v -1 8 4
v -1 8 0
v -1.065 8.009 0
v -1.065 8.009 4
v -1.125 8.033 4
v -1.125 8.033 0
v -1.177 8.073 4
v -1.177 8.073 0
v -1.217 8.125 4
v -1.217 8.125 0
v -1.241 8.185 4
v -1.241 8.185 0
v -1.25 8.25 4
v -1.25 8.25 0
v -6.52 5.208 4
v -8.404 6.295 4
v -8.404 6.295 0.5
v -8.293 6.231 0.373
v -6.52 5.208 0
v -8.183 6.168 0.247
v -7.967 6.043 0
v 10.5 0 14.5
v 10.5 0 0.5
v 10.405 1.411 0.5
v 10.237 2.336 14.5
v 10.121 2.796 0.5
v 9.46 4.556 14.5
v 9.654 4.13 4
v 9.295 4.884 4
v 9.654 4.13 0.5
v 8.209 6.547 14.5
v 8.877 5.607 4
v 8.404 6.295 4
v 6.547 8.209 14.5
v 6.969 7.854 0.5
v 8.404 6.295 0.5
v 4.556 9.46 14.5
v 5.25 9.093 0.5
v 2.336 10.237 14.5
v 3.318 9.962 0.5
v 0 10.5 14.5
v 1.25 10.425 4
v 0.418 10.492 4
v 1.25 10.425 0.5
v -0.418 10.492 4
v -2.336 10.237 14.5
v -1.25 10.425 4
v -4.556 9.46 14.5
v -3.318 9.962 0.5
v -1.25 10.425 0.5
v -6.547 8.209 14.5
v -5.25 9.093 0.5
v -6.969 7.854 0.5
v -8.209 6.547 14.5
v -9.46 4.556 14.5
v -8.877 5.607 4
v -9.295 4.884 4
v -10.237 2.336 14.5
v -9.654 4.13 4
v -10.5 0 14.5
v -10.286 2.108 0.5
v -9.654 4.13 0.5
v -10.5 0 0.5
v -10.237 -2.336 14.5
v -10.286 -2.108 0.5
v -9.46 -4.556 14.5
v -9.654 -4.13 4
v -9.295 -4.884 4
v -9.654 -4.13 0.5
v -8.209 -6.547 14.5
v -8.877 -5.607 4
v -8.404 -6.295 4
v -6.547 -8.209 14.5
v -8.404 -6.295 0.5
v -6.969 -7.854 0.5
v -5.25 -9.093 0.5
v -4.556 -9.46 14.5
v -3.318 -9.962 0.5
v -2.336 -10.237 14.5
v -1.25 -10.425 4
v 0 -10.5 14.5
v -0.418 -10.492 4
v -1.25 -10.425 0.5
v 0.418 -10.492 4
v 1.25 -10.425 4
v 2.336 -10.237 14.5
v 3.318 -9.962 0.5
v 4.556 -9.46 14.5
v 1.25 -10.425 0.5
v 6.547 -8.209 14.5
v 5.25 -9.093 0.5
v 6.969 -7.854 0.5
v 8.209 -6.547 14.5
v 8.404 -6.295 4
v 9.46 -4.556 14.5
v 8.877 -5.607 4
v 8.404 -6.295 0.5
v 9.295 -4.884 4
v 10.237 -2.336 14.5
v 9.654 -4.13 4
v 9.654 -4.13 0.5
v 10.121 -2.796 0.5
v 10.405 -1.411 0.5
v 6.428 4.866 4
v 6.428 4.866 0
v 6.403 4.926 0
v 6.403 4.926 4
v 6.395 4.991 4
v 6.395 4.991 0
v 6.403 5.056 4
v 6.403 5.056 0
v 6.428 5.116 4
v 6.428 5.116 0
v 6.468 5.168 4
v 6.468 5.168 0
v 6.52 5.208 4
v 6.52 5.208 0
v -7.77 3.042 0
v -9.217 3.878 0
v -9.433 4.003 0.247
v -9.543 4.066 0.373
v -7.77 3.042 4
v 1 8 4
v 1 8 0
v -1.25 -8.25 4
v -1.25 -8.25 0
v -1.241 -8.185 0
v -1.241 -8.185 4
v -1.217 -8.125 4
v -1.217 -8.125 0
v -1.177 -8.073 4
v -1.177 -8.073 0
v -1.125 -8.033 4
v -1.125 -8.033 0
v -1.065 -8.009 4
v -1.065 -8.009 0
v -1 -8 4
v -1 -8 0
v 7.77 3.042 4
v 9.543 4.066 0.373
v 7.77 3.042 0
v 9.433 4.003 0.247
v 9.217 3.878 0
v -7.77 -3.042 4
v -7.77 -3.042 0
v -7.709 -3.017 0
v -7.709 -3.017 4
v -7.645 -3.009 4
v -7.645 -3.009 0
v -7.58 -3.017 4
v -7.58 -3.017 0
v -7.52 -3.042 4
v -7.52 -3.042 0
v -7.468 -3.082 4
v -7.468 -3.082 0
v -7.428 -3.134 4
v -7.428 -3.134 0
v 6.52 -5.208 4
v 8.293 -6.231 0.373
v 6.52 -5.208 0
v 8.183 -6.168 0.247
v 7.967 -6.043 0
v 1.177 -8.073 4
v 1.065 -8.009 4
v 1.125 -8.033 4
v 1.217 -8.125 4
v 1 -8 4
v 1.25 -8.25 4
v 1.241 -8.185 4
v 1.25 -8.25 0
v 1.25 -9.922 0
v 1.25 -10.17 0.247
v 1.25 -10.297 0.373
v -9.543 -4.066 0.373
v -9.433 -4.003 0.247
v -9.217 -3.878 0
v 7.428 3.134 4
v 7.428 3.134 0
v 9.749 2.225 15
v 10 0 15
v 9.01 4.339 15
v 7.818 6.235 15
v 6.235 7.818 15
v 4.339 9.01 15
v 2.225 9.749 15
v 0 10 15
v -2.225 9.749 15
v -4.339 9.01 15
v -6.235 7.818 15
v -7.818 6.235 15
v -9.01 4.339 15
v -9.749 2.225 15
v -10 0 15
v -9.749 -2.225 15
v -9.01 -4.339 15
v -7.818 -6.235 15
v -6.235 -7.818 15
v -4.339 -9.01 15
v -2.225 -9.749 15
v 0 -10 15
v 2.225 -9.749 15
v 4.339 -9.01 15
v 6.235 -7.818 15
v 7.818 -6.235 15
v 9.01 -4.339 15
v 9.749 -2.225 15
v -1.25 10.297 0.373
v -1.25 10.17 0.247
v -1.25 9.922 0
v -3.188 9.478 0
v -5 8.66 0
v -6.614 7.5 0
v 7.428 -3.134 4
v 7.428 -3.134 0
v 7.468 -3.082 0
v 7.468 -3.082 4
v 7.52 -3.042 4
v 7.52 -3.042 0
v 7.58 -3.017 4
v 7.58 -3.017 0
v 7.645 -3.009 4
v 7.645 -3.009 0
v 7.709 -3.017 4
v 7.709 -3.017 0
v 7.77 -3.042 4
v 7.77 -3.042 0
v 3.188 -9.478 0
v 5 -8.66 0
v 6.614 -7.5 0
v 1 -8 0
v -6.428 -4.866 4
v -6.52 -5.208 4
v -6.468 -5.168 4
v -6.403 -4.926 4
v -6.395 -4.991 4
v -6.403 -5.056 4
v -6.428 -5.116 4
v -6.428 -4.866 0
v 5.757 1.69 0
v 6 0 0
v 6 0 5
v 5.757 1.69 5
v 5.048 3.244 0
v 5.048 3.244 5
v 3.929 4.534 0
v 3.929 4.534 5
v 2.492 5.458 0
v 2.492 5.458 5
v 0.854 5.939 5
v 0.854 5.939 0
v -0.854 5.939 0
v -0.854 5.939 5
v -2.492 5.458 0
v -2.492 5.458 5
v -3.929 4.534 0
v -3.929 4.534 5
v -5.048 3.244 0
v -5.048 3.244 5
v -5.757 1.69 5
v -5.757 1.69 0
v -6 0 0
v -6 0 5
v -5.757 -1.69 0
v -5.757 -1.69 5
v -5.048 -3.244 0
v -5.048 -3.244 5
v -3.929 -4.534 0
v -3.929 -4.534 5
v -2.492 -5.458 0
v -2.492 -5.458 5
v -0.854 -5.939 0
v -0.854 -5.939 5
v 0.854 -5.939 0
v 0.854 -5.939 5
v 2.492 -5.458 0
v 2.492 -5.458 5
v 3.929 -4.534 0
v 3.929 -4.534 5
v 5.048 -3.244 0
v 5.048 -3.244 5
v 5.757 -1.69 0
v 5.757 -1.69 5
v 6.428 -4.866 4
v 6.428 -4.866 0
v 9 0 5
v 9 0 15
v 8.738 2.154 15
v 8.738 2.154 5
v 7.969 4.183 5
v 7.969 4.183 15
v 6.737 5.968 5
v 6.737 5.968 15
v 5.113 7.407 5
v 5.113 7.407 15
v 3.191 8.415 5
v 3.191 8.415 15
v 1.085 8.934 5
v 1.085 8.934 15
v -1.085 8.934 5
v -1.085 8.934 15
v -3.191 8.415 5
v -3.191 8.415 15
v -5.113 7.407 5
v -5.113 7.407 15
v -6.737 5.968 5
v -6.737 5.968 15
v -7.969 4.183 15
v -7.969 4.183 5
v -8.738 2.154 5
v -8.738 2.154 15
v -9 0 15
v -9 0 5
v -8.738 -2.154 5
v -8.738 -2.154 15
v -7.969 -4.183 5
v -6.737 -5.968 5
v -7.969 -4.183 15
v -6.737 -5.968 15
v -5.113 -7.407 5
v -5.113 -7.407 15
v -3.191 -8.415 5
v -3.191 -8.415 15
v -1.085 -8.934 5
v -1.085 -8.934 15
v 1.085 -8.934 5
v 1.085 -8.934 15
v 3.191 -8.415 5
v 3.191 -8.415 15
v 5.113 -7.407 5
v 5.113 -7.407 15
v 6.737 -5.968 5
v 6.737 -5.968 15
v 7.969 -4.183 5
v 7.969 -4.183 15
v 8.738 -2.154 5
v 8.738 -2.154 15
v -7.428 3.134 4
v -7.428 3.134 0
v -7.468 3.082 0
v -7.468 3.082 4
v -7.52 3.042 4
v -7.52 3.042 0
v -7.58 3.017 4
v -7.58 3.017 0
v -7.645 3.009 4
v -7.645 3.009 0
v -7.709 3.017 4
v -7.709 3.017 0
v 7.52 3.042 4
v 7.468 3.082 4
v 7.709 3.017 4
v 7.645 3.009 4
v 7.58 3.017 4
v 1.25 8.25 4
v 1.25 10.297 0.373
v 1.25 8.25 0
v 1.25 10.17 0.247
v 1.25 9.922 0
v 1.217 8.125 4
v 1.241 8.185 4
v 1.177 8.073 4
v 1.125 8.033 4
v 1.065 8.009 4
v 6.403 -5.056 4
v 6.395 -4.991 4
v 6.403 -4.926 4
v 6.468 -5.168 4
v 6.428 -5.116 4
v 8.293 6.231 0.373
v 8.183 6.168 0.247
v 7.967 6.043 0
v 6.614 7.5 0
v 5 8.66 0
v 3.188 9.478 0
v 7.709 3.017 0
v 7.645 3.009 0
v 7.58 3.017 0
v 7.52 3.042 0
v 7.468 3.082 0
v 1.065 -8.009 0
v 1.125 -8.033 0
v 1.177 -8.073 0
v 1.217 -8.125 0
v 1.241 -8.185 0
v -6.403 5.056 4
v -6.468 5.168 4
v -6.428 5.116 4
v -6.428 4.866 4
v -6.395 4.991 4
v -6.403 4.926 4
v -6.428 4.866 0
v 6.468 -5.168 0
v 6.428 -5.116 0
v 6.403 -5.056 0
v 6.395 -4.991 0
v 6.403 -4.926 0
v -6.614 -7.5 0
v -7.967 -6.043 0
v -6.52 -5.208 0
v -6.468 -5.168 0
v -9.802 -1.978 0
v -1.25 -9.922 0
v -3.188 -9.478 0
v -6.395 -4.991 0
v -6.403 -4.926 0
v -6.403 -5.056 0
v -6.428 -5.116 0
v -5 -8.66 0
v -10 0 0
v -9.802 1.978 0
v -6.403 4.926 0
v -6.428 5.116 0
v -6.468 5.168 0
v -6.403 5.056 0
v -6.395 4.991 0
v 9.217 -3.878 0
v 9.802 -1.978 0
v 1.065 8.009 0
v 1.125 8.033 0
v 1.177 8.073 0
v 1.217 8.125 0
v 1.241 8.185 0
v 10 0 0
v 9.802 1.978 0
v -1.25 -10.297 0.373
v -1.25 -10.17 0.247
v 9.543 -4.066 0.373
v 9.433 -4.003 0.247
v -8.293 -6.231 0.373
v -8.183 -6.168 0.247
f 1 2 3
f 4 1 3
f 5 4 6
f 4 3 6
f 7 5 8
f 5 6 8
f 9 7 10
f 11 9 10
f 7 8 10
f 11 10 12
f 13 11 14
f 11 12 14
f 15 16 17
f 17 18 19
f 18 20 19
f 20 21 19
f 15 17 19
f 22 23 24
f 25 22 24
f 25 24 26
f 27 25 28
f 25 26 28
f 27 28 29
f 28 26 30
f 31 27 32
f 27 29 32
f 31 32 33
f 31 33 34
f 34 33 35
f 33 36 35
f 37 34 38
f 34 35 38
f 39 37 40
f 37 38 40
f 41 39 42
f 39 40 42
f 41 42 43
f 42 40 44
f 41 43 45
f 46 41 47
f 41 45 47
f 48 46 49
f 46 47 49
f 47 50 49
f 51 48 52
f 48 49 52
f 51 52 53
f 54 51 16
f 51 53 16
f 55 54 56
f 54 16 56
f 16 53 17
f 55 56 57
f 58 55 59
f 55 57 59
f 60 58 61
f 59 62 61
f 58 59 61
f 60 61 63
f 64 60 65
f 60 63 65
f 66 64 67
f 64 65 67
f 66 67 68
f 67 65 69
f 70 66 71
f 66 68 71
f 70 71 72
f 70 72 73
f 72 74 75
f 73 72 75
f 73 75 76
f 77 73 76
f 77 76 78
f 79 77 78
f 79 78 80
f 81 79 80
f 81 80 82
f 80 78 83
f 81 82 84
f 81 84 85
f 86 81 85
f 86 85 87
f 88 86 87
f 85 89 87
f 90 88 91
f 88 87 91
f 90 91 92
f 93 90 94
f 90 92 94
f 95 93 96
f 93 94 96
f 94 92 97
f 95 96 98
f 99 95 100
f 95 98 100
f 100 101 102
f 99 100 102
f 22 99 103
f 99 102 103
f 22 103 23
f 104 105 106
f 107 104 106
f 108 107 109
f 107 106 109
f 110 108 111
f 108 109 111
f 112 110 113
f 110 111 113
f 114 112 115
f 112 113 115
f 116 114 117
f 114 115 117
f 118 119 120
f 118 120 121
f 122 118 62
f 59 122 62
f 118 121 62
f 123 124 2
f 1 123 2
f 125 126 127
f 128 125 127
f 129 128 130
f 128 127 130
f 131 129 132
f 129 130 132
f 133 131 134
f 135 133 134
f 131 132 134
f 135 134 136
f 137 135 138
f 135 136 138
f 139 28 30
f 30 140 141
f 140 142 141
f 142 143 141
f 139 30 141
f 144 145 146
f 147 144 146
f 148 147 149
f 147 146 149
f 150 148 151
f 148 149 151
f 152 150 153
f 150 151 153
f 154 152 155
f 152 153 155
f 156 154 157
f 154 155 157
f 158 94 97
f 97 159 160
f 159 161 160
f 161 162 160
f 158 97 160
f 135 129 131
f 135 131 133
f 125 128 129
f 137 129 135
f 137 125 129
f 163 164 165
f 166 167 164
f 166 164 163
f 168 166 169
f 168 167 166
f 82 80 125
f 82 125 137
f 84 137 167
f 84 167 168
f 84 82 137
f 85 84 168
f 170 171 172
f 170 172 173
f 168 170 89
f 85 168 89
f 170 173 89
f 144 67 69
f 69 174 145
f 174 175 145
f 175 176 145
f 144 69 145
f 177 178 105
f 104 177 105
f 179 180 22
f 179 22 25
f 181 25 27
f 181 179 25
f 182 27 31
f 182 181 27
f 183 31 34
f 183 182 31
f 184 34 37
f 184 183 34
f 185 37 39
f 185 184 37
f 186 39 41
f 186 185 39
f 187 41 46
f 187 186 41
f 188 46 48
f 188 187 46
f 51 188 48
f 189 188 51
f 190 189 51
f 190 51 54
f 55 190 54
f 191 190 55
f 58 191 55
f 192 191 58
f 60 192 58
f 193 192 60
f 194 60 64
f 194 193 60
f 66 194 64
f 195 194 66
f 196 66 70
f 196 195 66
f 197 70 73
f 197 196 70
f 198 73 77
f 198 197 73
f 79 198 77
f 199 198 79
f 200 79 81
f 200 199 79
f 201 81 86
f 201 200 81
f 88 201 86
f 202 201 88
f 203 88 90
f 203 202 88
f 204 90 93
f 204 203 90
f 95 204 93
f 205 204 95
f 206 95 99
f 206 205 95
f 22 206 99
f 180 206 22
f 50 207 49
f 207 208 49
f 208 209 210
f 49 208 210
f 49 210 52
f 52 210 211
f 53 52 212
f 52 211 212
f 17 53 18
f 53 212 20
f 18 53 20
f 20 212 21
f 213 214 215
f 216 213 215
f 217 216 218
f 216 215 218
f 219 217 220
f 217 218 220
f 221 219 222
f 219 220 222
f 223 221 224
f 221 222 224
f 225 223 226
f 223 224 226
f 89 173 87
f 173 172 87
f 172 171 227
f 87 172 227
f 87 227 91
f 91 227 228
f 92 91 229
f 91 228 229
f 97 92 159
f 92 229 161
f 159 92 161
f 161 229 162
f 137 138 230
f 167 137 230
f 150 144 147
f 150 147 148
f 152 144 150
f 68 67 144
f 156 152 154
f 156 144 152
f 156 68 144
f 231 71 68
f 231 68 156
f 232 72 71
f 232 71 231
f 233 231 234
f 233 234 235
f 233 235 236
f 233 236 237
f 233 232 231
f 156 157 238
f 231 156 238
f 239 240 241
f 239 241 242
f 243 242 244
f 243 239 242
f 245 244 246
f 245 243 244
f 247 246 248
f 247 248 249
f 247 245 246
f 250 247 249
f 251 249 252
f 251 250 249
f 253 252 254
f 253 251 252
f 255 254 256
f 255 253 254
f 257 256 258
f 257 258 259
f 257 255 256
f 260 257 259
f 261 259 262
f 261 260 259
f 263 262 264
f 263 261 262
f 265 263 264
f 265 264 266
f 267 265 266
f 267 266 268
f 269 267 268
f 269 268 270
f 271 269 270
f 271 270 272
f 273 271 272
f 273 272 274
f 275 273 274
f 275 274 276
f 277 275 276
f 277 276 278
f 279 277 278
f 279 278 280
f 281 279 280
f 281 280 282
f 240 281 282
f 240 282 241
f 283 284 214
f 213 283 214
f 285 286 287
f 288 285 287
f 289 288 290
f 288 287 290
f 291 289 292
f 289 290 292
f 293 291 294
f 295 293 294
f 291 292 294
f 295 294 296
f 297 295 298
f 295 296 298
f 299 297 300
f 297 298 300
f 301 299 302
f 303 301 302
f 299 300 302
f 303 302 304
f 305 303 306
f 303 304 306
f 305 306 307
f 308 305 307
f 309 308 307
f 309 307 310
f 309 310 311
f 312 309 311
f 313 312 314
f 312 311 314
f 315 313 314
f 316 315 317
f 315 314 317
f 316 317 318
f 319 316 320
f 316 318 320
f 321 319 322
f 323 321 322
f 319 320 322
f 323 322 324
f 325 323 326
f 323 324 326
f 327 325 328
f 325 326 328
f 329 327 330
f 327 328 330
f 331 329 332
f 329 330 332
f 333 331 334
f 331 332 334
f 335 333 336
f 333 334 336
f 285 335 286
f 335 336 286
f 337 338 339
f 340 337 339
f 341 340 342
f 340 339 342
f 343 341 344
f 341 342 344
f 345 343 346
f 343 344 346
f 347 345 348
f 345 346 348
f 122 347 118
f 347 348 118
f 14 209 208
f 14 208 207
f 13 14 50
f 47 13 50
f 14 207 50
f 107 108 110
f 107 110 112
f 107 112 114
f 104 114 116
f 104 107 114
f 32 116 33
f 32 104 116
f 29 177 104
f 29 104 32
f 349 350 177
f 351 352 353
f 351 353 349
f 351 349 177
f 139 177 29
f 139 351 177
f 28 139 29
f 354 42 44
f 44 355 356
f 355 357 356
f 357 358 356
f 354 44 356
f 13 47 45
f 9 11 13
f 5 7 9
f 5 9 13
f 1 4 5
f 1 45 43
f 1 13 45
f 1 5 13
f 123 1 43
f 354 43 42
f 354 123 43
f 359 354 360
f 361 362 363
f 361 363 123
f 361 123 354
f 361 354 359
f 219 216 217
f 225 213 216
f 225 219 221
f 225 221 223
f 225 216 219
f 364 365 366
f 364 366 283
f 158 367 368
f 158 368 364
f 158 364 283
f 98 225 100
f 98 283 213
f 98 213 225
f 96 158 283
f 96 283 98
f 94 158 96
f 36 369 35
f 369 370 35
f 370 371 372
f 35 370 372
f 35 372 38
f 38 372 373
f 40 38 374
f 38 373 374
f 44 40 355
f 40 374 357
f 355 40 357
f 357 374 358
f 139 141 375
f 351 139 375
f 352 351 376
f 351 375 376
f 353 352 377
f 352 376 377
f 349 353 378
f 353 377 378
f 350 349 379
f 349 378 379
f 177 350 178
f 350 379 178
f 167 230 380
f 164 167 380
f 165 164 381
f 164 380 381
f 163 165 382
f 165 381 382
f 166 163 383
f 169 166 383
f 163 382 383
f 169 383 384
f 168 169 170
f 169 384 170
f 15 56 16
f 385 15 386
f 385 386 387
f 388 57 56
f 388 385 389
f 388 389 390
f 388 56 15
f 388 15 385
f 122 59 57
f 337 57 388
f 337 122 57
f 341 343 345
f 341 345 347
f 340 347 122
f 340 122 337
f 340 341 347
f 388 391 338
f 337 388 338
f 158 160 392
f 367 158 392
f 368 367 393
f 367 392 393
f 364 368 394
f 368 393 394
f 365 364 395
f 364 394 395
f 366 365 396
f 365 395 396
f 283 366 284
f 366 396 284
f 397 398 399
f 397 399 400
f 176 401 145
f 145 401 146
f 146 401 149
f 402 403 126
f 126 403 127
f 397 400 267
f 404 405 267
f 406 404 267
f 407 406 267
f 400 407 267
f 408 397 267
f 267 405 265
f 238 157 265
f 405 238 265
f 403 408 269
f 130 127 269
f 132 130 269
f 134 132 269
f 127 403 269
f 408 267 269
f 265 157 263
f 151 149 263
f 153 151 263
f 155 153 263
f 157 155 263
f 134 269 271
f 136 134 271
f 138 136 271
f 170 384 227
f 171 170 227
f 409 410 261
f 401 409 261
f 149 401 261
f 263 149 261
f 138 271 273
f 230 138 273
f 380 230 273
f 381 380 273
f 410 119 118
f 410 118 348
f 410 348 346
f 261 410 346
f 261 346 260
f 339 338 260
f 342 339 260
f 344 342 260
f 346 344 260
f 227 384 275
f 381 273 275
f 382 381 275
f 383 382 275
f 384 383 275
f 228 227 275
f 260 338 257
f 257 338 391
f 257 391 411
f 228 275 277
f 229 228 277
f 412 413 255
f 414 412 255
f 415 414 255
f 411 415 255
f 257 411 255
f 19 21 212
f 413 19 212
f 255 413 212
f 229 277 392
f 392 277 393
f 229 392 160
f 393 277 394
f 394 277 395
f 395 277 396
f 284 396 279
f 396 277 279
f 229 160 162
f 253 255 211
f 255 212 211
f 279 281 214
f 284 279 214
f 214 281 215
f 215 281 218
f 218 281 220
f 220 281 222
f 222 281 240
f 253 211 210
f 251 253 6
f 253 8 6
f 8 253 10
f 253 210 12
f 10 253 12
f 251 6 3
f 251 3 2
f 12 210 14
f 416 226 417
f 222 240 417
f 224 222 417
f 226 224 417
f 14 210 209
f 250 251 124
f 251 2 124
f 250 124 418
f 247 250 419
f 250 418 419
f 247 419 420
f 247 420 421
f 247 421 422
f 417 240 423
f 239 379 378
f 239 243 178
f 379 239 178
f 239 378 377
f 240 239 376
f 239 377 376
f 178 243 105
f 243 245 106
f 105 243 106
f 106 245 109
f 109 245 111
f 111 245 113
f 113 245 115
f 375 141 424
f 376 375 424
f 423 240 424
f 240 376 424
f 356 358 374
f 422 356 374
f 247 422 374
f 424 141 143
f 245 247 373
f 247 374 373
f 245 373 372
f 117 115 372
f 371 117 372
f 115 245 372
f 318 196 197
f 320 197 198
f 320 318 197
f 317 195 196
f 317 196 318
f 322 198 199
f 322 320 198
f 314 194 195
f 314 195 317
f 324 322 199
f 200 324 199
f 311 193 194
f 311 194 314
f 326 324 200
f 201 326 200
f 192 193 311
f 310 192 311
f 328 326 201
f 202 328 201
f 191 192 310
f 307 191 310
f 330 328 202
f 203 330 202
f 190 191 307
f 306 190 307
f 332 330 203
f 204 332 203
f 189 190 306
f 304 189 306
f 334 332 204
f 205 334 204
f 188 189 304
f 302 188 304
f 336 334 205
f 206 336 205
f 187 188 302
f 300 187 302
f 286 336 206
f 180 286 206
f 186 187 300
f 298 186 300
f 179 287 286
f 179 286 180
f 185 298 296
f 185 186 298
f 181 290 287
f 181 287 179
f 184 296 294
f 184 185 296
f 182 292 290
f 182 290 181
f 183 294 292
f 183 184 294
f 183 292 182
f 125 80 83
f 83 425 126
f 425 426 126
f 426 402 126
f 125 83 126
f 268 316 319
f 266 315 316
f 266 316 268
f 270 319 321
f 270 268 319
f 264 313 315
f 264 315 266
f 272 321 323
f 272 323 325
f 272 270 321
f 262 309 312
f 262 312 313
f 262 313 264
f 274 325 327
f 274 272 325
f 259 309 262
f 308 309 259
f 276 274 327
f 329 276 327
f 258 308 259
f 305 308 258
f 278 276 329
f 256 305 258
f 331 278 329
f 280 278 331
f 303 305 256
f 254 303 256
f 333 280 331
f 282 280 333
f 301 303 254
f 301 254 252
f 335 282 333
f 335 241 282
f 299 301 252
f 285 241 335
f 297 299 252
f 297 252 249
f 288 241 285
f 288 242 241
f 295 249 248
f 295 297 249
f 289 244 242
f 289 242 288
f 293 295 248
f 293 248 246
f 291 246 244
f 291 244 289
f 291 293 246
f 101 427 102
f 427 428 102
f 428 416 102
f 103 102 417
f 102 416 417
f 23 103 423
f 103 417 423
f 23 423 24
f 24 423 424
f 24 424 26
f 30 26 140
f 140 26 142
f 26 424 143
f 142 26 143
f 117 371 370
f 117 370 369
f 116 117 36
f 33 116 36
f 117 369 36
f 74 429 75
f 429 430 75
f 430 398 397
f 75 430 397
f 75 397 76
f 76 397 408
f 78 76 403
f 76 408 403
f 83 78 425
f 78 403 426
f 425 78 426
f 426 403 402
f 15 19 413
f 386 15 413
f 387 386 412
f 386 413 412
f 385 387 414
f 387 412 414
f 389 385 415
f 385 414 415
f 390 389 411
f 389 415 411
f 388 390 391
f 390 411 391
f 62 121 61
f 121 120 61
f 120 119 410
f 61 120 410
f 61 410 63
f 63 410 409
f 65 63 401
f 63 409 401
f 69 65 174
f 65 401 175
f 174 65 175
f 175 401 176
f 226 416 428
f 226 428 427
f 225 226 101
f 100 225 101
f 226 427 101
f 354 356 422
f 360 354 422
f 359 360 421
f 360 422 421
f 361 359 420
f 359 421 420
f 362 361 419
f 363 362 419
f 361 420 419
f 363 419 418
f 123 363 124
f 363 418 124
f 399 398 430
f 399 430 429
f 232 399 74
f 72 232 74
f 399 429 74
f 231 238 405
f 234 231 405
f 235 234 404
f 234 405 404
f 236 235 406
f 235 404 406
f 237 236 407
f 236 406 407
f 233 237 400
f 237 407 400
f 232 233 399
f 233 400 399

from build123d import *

# Parameters (mm, degrees)
F0_R     = 10.5
F0_R_2   = 6
F1_DEPTH = 15
F2_R     = 9
F2_R_2   = 6
F3_DEPTH = 10
F5_DEPTH = 4
F6_SIZE  = 0.5
F7_SIZE  = 0.5


with BuildPart() as f1:
    # F0 (on Top) → F1 (new body)
    with BuildSketch(Plane.XY):
        Circle(F0_R)
        Circle(F0_R_2, mode=Mode.SUBTRACT)
    extrude(amount=F1_DEPTH)

    # F2 (on face) → F3 (cut)
    with BuildSketch(Plane.XY.offset(15)):
        Circle(F2_R)
        Circle(F2_R_2, mode=Mode.SUBTRACT)
    extrude(amount=-F3_DEPTH, mode=Mode.SUBTRACT)

    # F4 (on face) → F5 (cut)
    with BuildSketch(Plane(origin=(0, 0, 0), x_dir=(1, 0, 0), z_dir=(0, 0, -1))):
        with BuildLine():
            Line((1.25, 8.25), (1.25, 13))
            Line((1.25, 13), (-1.25, 13))
            Line((-1.25, 13), (-1.25, 8.25))
            ThreePointArc((-1.25, 8.25), (-1.1767766953, 8.0732233047), (-1, 8))
            Line((-1, 8), (1, 8))
            ThreePointArc((1, 8), (1.1767766953, 8.0732233047), (1.25, 8.25))
        make_face()
        with BuildLine():
            Line((-6.5197095812, 5.2075317547), (-10.6333302492, 7.5825317547))
            Line((-10.6333302492, 7.5825317547), (-11.8833302492, 5.4174682453))
            Line((-11.8833302492, 5.4174682453), (-7.7697095812, 3.0424682453))
            ThreePointArc((-7.7697095812, 3.0424682453), (-7.5800048199, 3.0174931396), (-7.4282032303, 3.1339745962))
            Line((-7.4282032303, 3.1339745962), (-6.4282032303, 4.8660254038))
            ThreePointArc((-6.4282032303, 4.8660254038), (-6.4032281246, 5.0557301651), (-6.5197095812, 5.2075317547))
        make_face()
        with BuildLine():
            Line((-7.7697095812, -3.0424682453), (-11.8833302492, -5.4174682453))
            Line((-11.8833302492, -5.4174682453), (-10.6333302492, -7.5825317547))
            Line((-10.6333302492, -7.5825317547), (-6.5197095812, -5.2075317547))
            ThreePointArc((-6.5197095812, -5.2075317547), (-6.4032281246, -5.0557301651), (-6.4282032303, -4.8660254038))
            Line((-6.4282032303, -4.8660254038), (-7.4282032303, -3.1339745962))
            ThreePointArc((-7.4282032303, -3.1339745962), (-7.5800048199, -3.0174931396), (-7.7697095812, -3.0424682453))
        make_face()
        with BuildLine():
            Line((-1.25, -8.25), (-1.25, -13))
            Line((-1.25, -13), (1.25, -13))
            Line((1.25, -13), (1.25, -8.25))
            ThreePointArc((1.25, -8.25), (1.1767766953, -8.0732233047), (1, -8))
            Line((1, -8), (-1, -8))
            ThreePointArc((-1, -8), (-1.1767766953, -8.0732233047), (-1.25, -8.25))
        make_face()
        with BuildLine():
            Line((6.5197095812, -5.2075317547), (10.6333302492, -7.5825317547))
            Line((10.6333302492, -7.5825317547), (11.8833302492, -5.4174682453))
            Line((11.8833302492, -5.4174682453), (7.7697095812, -3.0424682453))
            ThreePointArc((7.7697095812, -3.0424682453), (7.5800048199, -3.0174931396), (7.4282032303, -3.1339745962))
            Line((7.4282032303, -3.1339745962), (6.4282032303, -4.8660254038))
            ThreePointArc((6.4282032303, -4.8660254038), (6.4032281246, -5.0557301651), (6.5197095812, -5.2075317547))
        make_face()
        with BuildLine():
            Line((7.7697095812, 3.0424682453), (11.8833302492, 5.4174682453))
            Line((11.8833302492, 5.4174682453), (10.6333302492, 7.5825317547))
            Line((10.6333302492, 7.5825317547), (6.5197095812, 5.2075317547))
            ThreePointArc((6.5197095812, 5.2075317547), (6.4032281246, 5.0557301651), (6.4282032303, 4.8660254038))
            Line((6.4282032303, 4.8660254038), (7.4282032303, 3.1339745962))
            ThreePointArc((7.4282032303, 3.1339745962), (7.5800048199, 3.0174931396), (7.7697095812, 3.0424682453))
        make_face()
    extrude(amount=-F5_DEPTH, mode=Mode.SUBTRACT)

    # F6
    f6_edges = [f1.edges().sort_by_distance(p)[0] for p in [
        (-5.25, -9.093267, 0),
        (5.25, -9.093267, 0),
        (10.286224, 2.107984, 0),
        (5.25, 9.093267, 0),
        (-5.25, 9.093267, 0),
        (-10.5, 0, 0),
    ]]
    chamfer(f6_edges, length=F6_SIZE)

    # F7
    f7_edges = [f1.edges().sort_by_distance(p)[0] for p in [
        (-10.5, 0, 15),
    ]]
    chamfer(f7_edges, length=F7_SIZE)


solid = f1.part
